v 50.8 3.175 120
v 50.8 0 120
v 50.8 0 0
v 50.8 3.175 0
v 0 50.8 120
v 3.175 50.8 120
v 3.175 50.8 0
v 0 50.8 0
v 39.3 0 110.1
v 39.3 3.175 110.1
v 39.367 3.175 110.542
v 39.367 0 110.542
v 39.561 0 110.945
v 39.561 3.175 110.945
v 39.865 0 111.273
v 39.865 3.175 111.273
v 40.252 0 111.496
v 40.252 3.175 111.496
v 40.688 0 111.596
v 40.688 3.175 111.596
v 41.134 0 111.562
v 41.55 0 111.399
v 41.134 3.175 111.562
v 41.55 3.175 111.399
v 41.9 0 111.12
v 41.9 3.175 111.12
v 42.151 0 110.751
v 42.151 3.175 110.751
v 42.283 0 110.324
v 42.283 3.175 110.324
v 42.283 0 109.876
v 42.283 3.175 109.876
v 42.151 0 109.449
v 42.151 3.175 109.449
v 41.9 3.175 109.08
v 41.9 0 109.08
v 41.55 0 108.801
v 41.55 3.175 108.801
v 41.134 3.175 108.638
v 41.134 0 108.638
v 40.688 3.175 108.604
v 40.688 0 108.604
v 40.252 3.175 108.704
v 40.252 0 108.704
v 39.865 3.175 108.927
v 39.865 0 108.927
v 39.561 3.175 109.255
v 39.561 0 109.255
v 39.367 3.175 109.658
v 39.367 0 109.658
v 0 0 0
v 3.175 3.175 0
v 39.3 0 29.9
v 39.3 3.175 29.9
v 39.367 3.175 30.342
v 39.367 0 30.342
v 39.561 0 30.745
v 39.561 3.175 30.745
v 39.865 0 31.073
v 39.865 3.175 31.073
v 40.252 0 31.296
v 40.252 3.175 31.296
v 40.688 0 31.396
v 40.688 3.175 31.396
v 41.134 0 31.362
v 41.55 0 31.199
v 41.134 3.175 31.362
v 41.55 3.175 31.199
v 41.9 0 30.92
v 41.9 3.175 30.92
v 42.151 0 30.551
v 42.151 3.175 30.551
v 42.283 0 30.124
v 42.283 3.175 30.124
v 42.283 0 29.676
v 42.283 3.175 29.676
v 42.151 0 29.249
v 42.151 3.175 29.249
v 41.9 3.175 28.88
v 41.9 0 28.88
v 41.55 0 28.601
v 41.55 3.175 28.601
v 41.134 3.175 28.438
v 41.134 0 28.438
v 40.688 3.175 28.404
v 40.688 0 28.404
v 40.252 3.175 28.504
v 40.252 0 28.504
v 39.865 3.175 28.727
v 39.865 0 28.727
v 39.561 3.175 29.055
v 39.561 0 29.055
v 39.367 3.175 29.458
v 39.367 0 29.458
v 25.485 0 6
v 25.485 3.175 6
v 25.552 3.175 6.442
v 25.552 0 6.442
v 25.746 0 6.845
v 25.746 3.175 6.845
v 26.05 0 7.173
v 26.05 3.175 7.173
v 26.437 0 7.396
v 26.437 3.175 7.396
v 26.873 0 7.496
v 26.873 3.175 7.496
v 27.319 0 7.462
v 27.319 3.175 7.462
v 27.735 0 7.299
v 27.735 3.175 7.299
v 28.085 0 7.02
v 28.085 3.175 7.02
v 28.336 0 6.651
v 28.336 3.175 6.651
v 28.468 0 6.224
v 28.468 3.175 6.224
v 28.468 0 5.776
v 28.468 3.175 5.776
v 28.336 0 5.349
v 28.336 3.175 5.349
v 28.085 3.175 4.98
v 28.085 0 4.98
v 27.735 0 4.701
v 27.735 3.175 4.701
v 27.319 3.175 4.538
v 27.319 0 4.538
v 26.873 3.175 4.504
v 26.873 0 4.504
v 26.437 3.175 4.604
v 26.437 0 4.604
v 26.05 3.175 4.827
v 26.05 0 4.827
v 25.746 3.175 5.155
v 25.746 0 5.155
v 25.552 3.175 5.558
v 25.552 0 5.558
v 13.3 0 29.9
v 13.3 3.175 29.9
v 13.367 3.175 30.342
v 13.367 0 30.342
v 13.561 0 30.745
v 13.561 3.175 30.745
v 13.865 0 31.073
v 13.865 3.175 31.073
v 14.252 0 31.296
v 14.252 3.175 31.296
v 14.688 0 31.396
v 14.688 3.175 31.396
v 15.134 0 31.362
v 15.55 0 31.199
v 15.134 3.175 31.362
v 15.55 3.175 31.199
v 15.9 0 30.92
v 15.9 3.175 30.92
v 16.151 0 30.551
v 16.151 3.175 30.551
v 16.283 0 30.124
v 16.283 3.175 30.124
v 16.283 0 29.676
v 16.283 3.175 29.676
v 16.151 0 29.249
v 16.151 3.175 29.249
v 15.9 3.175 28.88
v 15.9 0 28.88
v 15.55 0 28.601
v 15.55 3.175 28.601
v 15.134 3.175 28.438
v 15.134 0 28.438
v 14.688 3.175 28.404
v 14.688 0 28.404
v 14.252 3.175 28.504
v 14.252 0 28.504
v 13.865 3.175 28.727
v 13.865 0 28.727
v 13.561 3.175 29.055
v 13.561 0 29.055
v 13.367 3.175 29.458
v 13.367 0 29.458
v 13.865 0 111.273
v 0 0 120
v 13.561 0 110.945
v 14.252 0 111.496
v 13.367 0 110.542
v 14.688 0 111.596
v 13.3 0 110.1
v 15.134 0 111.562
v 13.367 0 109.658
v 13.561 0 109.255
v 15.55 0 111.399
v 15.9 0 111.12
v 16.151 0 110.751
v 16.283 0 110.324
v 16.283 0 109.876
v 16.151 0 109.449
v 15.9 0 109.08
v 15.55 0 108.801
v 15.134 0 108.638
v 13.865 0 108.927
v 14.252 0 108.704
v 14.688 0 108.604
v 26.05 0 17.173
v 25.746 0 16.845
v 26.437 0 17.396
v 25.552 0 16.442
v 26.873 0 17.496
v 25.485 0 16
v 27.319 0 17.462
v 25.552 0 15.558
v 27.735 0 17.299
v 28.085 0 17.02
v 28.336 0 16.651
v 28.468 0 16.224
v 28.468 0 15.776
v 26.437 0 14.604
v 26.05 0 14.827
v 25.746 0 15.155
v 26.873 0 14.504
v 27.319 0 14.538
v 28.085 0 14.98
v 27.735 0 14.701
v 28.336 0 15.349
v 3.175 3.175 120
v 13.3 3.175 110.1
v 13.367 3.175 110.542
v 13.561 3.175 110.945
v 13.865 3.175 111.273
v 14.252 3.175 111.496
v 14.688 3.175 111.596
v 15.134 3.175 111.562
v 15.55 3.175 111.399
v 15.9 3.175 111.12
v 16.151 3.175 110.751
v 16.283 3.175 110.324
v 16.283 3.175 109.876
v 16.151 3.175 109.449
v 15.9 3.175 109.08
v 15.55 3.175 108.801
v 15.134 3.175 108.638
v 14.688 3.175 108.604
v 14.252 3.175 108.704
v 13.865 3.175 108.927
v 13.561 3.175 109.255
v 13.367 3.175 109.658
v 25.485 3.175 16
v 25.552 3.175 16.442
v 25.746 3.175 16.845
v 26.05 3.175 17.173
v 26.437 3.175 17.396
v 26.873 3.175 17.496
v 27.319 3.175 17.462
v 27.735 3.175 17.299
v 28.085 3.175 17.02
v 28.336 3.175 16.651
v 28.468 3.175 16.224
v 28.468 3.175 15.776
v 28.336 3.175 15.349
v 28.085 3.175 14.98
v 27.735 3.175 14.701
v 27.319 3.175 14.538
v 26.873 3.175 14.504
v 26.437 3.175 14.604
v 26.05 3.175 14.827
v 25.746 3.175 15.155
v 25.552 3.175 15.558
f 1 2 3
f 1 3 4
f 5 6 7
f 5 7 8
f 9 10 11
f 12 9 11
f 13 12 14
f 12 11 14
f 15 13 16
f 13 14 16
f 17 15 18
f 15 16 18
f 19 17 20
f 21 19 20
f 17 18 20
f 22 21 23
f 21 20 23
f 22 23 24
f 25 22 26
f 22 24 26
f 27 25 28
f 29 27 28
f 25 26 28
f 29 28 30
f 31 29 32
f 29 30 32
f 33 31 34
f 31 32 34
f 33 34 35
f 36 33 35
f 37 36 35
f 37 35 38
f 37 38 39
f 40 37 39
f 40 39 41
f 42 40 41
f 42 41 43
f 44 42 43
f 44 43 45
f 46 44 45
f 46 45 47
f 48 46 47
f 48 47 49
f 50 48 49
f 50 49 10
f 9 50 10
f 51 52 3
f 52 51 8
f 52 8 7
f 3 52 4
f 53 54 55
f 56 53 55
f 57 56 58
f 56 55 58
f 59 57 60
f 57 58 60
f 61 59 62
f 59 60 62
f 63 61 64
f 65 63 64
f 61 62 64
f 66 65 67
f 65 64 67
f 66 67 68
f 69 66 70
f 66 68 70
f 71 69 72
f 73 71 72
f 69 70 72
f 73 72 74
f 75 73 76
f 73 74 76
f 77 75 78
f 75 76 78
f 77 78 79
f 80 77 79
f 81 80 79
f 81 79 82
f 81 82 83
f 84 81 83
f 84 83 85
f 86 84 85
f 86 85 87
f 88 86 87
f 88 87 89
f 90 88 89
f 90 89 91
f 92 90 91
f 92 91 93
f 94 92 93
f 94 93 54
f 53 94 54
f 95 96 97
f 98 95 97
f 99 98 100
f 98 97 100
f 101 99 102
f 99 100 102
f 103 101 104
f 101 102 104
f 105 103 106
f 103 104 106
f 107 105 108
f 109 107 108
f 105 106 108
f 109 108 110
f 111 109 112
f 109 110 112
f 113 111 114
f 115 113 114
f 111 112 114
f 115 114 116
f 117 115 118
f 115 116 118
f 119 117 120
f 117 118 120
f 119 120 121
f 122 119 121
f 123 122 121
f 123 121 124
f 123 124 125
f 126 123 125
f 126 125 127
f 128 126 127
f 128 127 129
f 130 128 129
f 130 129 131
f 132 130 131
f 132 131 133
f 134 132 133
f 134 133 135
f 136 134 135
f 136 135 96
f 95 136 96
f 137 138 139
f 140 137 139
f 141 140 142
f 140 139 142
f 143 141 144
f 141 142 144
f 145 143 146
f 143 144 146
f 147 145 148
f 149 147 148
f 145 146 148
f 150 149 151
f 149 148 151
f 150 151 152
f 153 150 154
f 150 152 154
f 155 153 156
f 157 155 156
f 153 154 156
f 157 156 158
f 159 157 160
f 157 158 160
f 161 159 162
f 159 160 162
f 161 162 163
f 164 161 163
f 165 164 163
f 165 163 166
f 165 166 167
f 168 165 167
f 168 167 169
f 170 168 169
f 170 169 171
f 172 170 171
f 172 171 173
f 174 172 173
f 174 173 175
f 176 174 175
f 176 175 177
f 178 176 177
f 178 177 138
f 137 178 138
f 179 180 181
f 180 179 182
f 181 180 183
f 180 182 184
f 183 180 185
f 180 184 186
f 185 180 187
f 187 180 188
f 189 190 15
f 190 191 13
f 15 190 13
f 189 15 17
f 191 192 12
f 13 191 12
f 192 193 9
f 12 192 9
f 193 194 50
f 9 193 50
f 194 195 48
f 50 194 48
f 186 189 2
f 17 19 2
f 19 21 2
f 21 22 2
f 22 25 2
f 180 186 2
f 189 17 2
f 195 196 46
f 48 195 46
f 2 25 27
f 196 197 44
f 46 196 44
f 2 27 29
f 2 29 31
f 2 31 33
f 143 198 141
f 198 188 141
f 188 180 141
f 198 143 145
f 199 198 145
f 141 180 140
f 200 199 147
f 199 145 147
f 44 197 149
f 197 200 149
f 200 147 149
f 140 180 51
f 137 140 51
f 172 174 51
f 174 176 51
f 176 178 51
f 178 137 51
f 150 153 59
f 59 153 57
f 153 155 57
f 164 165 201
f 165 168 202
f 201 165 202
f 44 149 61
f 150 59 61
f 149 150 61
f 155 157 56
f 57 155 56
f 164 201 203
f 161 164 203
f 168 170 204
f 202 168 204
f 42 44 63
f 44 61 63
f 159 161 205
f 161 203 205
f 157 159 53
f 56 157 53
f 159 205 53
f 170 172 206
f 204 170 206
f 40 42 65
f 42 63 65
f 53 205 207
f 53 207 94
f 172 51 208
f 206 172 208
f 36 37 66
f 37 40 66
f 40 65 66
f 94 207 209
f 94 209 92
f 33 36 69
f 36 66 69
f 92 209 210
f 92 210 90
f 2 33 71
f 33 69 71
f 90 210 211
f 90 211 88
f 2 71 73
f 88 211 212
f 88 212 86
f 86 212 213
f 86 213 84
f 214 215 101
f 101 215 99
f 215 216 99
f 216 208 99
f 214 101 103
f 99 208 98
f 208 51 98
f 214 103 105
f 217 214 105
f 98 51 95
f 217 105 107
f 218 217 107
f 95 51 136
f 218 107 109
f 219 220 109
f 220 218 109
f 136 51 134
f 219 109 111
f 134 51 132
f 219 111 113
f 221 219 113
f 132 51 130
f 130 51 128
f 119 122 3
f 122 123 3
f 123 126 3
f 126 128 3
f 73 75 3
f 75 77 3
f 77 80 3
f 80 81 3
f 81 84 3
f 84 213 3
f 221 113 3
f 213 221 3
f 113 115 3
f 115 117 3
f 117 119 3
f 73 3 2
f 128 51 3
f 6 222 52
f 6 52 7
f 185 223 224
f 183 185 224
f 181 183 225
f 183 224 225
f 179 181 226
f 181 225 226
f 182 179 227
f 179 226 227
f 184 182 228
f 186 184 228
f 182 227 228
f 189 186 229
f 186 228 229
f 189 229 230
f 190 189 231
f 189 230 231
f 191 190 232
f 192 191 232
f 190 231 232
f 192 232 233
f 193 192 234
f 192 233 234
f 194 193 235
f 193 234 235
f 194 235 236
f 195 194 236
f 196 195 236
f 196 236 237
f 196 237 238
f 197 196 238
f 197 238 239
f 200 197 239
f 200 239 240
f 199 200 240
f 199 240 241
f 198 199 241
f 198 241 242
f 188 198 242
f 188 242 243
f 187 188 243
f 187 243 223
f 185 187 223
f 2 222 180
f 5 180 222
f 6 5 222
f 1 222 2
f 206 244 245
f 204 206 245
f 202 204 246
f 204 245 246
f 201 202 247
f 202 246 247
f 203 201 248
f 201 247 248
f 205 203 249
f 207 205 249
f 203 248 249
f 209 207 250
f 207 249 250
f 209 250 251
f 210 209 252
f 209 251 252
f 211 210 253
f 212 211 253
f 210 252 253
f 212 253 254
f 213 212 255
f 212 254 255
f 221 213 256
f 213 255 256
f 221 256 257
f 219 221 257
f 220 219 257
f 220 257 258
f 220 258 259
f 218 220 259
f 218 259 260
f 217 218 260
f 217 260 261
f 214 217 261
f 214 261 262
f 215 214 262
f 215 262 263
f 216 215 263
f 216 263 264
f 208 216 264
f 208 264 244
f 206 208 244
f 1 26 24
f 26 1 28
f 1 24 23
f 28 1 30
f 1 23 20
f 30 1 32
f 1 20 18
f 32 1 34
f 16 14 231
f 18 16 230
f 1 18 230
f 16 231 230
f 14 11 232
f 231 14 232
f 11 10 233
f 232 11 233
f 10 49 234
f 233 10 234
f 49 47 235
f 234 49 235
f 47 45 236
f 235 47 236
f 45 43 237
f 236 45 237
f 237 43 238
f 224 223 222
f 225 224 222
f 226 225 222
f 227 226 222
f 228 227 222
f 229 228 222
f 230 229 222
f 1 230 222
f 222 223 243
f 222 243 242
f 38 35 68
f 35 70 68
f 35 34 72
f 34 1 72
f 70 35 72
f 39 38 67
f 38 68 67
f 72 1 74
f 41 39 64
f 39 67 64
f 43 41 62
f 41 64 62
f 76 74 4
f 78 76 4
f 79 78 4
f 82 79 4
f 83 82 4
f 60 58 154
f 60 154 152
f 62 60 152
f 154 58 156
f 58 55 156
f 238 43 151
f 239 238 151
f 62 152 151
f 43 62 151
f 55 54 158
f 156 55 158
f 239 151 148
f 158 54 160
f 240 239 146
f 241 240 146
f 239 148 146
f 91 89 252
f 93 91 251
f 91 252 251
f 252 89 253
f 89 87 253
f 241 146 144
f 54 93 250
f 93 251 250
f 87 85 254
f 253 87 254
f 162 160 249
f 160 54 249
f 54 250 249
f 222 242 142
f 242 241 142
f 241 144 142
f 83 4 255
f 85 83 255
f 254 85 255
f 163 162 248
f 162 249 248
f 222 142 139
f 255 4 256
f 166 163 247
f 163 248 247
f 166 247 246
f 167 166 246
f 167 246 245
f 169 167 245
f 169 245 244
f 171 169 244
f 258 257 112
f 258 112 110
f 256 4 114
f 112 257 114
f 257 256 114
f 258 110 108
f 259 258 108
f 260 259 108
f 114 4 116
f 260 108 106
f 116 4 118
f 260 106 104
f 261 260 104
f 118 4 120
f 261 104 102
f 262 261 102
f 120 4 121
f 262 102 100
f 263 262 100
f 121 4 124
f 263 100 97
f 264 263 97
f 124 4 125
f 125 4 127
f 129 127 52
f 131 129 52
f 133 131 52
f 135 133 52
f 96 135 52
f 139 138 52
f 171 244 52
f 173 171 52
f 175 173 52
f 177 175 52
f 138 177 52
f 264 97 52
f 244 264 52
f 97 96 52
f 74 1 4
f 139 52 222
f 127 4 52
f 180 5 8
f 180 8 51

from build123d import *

# Parameters (mm, degrees)
SALIENTE_EXTRUIR1_DEPTH = 120
CROQUIS2_R              = 1.5
CORTAR_EXTRUIR1_DEPTH   = 100
CROQUIS3_R              = 1.5
CORTAR_EXTRUIR2_DEPTH   = 100


with BuildPart() as part:
    # Croquis1 → Saliente-Extruir1 (new body)
    with BuildSketch(Plane.XY):
        Polygon((0, 0), (50.8, 0), (50.8, 3.175), (3.175, 3.175), (3.175, 50.8), (0, 50.8), align=None)
    extrude(amount=SALIENTE_EXTRUIR1_DEPTH)

    # Croquis2 → Cortar-Extruir1 (cut)
    with BuildSketch(Plane(origin=(0, 3.175, 0), x_dir=(1, 0, 0), z_dir=(0, 1, 0))):
        with Locations(Location((40.8, -29.9, 0), (0, 0, 180))):
            Circle(CROQUIS2_R)
        with Locations(Location((14.8, -29.9, 0), (0, 0, 180))):
            Circle(CROQUIS2_R)
        with Locations(Location((40.8, -110.1, 0), (0, 0, 180))):
            Circle(CROQUIS2_R)
        with Locations(Location((14.8, -110.1, 0), (0, 0, 180))):
            Circle(CROQUIS2_R)
    extrude(amount=-CORTAR_EXTRUIR1_DEPTH, mode=Mode.SUBTRACT)

    # Croquis3 → Cortar-Extruir2 (cut)
    with BuildSketch(Plane(origin=(0, 3.175, 0), x_dir=(1, 0, 0), z_dir=(0, 1, 0))):
        with Locations(Location((26.985, -6, 0), (0, 0, 180))):
            Circle(CROQUIS3_R)
        with Locations(Location((26.985, -16, 0), (0, 0, 180))):
            Circle(CROQUIS3_R)
    extrude(amount=-CORTAR_EXTRUIR2_DEPTH, mode=Mode.SUBTRACT)


solid = part.part
